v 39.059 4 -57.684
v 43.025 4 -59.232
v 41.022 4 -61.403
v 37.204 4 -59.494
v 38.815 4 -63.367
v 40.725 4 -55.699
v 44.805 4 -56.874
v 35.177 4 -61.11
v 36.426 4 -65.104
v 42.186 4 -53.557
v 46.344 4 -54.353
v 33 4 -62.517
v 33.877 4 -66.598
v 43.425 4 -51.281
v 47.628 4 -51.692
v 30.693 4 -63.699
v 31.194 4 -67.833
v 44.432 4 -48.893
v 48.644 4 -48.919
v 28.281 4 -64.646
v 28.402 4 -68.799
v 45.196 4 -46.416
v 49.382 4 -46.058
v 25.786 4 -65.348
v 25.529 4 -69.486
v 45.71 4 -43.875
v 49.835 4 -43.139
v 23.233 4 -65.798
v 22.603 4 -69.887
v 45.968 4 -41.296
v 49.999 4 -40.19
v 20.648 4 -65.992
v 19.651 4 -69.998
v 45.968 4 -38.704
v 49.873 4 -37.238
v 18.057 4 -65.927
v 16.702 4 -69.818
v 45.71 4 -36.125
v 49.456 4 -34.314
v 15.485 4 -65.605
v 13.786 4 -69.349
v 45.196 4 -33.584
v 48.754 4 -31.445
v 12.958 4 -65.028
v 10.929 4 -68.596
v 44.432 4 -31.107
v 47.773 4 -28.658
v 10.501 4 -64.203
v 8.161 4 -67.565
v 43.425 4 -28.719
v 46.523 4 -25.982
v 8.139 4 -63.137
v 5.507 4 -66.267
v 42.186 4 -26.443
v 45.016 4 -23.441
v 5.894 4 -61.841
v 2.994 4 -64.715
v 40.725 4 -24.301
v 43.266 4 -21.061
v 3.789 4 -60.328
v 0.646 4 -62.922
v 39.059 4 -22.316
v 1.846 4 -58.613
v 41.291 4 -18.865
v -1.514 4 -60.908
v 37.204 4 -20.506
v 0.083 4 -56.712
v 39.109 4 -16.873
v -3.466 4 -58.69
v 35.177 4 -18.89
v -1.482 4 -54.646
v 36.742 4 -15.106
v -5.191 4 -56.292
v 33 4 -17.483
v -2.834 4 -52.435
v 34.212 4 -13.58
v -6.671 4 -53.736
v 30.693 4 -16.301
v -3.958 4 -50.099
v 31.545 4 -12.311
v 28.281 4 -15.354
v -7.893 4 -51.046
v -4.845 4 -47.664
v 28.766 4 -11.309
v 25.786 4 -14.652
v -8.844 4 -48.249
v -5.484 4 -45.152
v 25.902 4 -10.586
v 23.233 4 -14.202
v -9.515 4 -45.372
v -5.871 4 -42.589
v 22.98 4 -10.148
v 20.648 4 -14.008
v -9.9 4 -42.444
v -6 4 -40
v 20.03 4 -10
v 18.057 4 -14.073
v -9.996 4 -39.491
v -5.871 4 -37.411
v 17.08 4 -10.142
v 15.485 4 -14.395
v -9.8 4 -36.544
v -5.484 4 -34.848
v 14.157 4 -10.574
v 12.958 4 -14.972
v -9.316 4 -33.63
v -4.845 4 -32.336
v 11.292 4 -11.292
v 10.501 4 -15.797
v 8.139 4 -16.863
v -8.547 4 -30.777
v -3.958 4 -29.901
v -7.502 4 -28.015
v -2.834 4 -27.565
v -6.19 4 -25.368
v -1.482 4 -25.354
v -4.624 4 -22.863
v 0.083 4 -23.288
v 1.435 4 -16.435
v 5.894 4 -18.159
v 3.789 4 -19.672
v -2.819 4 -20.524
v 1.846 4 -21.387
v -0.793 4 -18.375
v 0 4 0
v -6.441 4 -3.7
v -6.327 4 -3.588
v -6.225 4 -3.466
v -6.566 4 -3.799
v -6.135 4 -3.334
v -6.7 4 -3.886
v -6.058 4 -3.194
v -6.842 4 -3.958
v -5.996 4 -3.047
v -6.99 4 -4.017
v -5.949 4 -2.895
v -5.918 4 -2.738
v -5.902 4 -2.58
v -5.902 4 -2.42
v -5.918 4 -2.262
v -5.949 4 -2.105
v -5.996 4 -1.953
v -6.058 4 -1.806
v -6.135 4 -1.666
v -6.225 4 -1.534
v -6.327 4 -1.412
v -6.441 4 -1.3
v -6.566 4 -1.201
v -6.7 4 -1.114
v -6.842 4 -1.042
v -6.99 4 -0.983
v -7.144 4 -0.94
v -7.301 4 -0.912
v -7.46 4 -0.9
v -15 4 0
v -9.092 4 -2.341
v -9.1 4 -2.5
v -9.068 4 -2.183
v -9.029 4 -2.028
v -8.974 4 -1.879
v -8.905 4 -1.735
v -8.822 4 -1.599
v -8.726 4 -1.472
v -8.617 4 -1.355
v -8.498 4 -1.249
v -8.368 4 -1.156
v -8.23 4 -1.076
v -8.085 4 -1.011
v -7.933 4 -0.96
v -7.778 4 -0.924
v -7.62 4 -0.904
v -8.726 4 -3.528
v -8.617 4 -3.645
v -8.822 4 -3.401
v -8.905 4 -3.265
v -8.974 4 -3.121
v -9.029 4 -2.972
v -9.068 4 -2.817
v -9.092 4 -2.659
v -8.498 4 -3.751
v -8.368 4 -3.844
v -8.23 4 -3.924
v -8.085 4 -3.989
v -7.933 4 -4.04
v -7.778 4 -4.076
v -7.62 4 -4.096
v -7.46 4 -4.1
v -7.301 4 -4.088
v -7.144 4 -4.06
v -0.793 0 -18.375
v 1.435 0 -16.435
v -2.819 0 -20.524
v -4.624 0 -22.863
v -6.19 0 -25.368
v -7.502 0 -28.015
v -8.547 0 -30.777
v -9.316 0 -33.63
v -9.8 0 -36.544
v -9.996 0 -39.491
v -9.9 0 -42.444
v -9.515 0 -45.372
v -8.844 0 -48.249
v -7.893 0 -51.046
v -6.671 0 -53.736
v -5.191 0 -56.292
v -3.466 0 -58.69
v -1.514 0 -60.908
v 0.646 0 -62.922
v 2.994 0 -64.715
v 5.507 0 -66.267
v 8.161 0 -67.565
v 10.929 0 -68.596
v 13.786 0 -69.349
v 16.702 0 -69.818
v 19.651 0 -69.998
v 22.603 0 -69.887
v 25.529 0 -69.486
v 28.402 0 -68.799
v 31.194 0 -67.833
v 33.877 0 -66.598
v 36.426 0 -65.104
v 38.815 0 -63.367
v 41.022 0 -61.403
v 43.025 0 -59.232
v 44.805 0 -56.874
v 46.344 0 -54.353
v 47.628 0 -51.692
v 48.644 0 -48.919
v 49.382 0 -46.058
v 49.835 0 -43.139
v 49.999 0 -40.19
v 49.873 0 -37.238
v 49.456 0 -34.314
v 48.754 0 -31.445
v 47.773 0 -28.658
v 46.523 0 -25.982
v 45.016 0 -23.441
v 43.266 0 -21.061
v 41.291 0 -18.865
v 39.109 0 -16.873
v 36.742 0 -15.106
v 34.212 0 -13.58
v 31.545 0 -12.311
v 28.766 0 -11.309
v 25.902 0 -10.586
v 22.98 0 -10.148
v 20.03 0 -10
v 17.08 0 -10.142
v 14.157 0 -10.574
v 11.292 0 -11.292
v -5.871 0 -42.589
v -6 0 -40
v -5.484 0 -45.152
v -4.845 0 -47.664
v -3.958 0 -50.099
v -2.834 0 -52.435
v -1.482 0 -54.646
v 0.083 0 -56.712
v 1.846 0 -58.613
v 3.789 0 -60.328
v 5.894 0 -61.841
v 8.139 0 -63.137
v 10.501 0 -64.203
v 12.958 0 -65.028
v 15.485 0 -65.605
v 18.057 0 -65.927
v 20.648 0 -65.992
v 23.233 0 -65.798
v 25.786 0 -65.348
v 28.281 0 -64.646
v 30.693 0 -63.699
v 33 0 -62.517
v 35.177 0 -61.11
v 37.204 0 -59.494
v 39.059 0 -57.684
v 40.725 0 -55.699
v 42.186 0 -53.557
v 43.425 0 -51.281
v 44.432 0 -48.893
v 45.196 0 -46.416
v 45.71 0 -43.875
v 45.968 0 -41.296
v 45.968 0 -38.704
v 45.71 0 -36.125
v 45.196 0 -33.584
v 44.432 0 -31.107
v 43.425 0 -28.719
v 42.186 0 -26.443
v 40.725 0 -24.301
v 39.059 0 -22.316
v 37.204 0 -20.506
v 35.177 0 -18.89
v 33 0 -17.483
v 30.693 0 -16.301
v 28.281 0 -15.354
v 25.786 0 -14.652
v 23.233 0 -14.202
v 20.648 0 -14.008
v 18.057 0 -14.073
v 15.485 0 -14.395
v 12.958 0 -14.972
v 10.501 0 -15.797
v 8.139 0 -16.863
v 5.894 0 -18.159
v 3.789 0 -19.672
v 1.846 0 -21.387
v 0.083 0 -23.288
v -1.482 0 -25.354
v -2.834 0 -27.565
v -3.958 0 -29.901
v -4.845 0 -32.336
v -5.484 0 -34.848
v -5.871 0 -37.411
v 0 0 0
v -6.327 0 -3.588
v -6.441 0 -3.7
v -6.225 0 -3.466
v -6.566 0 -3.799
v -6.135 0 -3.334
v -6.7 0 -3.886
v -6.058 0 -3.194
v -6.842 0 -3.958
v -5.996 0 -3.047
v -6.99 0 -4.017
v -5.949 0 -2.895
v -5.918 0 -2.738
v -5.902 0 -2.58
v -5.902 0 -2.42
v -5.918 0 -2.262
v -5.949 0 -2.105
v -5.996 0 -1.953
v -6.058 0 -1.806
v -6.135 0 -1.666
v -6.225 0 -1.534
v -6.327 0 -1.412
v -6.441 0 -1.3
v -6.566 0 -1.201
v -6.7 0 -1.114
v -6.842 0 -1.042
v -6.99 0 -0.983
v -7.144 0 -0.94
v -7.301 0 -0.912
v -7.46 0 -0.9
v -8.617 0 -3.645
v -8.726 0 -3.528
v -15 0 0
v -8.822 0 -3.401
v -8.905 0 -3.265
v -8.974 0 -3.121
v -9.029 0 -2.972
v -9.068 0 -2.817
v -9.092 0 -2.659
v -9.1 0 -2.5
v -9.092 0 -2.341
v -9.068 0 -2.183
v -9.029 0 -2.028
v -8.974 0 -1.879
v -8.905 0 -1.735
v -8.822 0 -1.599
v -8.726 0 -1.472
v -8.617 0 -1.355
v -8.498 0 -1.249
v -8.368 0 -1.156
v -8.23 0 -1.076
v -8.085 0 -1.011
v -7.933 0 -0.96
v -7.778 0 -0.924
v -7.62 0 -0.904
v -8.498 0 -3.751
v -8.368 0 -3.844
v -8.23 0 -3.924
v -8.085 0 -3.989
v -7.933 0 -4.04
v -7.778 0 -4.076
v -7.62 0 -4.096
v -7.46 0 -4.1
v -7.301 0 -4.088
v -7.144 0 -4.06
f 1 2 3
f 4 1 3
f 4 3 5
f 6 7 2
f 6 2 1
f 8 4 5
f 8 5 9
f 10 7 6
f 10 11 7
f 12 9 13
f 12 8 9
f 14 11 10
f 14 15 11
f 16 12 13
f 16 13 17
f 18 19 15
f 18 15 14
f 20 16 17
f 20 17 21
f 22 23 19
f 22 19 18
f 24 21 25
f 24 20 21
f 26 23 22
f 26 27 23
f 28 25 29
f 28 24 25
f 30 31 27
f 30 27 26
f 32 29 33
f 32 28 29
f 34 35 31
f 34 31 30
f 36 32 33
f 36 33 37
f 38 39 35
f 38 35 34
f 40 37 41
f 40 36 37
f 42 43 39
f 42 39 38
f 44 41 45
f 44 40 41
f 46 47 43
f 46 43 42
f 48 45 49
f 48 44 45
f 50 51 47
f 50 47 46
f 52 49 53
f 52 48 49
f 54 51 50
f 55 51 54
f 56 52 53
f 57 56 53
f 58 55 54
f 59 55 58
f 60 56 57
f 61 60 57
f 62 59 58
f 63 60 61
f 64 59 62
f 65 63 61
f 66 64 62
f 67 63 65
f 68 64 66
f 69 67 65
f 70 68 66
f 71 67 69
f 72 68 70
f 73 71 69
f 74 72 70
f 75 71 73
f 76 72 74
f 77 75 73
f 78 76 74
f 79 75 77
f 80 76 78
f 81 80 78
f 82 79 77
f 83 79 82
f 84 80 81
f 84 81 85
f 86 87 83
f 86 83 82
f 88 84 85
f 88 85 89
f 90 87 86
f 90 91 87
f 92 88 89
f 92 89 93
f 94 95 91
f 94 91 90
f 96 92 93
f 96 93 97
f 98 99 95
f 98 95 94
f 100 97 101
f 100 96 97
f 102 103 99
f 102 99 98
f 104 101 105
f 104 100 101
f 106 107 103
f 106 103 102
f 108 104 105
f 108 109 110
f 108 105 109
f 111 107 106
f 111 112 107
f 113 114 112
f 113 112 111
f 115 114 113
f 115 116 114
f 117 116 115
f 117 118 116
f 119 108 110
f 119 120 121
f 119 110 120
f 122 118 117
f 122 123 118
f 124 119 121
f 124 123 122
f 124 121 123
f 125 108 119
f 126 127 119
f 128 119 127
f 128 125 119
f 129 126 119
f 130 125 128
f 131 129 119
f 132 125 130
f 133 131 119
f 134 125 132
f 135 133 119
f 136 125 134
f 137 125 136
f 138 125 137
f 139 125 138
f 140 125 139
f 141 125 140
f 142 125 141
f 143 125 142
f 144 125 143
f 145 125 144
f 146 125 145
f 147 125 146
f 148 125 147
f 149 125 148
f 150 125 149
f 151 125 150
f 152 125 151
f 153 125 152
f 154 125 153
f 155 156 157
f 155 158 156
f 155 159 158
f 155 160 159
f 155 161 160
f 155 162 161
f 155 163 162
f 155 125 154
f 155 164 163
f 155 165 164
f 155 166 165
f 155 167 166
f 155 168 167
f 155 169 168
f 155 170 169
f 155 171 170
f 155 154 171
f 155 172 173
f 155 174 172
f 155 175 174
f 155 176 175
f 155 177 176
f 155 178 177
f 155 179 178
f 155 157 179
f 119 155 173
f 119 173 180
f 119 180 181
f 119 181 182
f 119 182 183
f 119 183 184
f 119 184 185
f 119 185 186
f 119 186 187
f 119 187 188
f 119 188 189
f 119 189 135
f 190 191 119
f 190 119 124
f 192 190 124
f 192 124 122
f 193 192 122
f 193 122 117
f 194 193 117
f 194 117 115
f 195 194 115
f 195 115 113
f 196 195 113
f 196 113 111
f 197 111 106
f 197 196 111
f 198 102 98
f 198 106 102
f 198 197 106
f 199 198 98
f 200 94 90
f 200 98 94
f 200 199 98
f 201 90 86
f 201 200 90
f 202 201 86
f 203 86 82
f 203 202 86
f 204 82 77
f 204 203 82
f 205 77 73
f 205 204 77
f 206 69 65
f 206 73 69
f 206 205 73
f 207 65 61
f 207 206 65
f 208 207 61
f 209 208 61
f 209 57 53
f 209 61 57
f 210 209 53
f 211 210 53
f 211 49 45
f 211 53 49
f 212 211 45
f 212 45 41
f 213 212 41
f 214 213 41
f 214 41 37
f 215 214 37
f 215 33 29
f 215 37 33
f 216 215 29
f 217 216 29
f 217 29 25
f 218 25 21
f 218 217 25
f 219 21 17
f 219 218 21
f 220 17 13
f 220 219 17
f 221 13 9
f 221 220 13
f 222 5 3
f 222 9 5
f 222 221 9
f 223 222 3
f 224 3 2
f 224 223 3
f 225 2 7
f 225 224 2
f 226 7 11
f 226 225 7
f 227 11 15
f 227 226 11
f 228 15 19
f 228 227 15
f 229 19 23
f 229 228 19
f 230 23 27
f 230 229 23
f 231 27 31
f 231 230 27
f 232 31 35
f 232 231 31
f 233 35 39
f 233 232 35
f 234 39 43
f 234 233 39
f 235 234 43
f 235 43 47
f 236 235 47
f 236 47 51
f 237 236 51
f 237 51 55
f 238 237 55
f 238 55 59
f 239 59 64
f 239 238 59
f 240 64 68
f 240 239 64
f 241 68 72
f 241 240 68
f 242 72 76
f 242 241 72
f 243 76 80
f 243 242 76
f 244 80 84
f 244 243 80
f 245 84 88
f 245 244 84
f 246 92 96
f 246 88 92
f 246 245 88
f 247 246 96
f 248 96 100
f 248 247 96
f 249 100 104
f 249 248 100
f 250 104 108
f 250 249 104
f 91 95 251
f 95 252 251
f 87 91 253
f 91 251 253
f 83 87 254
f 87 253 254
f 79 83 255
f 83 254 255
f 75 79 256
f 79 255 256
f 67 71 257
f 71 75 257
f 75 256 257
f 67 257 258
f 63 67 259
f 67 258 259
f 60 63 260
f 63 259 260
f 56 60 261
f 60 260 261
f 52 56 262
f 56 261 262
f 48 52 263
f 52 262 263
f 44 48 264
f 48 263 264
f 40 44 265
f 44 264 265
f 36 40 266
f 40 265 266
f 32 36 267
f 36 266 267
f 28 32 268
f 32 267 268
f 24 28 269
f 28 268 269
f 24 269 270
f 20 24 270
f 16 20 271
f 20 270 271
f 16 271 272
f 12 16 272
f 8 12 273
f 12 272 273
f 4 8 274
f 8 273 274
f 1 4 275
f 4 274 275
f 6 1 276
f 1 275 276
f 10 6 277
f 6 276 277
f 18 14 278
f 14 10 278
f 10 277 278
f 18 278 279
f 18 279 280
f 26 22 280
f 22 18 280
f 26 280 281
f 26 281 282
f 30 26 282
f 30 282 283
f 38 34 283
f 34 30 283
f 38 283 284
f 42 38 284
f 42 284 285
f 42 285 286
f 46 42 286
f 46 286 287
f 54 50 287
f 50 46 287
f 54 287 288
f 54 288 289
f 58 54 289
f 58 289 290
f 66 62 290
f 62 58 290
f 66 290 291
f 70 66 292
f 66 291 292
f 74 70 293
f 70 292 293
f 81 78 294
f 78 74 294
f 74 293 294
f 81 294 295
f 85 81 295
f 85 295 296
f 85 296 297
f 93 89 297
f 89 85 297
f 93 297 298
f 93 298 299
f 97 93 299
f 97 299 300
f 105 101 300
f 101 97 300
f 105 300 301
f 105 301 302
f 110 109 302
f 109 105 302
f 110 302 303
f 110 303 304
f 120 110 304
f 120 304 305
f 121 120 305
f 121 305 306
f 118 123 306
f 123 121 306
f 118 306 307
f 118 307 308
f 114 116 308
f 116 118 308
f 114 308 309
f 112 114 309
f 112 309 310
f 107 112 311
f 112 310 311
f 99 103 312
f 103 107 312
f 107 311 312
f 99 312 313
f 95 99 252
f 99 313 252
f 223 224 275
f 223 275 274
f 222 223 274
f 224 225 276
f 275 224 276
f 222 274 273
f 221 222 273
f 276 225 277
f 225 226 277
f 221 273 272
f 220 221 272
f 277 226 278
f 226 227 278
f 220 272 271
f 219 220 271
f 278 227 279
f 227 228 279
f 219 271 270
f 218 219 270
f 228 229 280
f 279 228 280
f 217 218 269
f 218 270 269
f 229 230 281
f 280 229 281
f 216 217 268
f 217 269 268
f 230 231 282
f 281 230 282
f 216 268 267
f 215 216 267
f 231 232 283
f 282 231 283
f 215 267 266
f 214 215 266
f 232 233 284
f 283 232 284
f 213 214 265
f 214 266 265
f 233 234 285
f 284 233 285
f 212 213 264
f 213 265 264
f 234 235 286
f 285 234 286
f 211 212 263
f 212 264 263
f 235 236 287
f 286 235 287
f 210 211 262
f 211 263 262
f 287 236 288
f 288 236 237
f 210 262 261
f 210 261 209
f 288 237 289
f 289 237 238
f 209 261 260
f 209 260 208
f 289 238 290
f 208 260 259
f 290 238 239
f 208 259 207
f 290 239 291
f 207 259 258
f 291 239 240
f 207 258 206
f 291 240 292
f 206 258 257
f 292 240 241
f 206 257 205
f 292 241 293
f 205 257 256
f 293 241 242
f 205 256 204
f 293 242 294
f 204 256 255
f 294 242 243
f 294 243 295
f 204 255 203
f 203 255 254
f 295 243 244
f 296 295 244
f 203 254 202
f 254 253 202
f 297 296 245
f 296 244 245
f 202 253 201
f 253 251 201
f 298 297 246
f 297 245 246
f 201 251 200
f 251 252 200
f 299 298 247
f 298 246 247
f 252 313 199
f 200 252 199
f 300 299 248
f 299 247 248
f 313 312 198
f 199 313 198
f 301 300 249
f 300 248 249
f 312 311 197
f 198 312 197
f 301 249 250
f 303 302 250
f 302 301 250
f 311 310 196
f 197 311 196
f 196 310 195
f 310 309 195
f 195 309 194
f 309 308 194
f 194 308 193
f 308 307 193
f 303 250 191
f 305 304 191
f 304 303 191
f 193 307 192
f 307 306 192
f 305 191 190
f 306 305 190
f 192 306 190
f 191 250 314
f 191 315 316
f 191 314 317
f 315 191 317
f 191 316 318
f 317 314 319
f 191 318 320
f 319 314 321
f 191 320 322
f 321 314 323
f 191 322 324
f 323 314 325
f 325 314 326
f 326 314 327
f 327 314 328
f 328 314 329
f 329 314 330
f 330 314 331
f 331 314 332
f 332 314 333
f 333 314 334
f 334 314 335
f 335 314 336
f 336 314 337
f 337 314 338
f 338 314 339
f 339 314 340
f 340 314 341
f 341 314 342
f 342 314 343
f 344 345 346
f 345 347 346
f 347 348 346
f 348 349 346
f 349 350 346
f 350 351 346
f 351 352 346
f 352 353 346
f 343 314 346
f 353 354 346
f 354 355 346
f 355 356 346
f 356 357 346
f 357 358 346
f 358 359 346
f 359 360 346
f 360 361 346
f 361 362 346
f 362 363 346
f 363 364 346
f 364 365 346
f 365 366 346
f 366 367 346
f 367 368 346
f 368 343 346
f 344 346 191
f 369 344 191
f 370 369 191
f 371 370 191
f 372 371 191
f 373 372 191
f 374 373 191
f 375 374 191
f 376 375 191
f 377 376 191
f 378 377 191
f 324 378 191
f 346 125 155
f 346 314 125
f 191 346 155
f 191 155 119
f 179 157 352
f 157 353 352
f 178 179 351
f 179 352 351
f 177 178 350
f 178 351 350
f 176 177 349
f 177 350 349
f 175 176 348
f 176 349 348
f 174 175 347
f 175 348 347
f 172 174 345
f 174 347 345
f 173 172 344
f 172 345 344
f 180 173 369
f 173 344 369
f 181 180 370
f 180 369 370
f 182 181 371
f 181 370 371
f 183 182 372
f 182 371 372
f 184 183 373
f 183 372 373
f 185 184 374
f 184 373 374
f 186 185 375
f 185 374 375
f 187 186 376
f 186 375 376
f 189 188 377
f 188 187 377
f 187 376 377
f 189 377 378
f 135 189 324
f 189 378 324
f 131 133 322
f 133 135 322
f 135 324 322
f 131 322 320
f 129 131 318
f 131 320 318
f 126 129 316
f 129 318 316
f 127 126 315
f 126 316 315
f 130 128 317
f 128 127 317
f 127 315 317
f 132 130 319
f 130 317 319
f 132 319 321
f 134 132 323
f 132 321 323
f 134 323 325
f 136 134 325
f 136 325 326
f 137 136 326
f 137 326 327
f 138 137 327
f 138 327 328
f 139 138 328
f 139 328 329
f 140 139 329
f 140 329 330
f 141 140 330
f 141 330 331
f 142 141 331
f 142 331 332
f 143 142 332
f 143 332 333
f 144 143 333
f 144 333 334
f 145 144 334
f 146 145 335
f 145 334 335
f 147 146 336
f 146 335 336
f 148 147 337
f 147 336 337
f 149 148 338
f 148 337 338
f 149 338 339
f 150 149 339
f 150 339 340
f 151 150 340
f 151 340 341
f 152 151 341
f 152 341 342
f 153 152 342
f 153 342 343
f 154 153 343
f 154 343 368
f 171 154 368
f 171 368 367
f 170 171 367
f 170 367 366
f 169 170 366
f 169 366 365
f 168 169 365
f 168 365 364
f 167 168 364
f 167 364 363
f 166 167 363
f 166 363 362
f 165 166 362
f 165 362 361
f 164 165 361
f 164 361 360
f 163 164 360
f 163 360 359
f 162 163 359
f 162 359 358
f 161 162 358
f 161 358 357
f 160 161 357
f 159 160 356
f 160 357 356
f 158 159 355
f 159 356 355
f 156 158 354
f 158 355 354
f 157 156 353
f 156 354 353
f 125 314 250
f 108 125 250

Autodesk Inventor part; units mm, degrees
ref_plane "YZ Plane" through (0, 0, 0) normal (1, 0, 0) x (0, 1, 0)
ref_plane "XZ Plane" through (0, 0, 0) normal (0, 1, 0) x (-1, 0, 0)
ref_plane "XY Plane" through (0, 0, 0) normal (0, 0, 1) x (1, 0, 0)
sketch "Sketch1" plane through (0, 0, 0) normal (0, 1, 0) x (-1, 0, 0)
  line L0 (0, 0) -> (15, 0)
  circle A0 centre (7.5, -2.5) radius 1.6
  line L1 (15, 0) -> (44.3967, 0) construction
  line L2 (0, 0) -> (21.2132, 0) construction
  circle A1 centre (-20, -40) radius 26
  arc A2 (-11.2917, -11.2917) -> (-1.4346, -16.4346) centre (-20, -40) ccw
  line L3 (15, 0) -> (-1.4346, -16.4346)
  line L4 (0, 0) -> (-11.2917, -11.2917)
  line L5 (0, 0) -> (15.9689, 0) construction
  dimension "d0" = 15
  dimension "d1" = 2.5
  dimension "d2" = 7.5
  dimension "d3" = 3.2
  dimension "d6" = 52
  dimension "d7" = 40
  dimension "d8" = 60
  dimension "d10" = 20
  dimension "d11" = 135
extrude "Extrusion1" add sketch "Sketch1" along normal blind 4
sketch "Sketch2" plane through (0, 4, 0) normal (0, 1, 0) x (1, 0, 0)
  point P0 (0, 0)
properties part number "Float Walls"
